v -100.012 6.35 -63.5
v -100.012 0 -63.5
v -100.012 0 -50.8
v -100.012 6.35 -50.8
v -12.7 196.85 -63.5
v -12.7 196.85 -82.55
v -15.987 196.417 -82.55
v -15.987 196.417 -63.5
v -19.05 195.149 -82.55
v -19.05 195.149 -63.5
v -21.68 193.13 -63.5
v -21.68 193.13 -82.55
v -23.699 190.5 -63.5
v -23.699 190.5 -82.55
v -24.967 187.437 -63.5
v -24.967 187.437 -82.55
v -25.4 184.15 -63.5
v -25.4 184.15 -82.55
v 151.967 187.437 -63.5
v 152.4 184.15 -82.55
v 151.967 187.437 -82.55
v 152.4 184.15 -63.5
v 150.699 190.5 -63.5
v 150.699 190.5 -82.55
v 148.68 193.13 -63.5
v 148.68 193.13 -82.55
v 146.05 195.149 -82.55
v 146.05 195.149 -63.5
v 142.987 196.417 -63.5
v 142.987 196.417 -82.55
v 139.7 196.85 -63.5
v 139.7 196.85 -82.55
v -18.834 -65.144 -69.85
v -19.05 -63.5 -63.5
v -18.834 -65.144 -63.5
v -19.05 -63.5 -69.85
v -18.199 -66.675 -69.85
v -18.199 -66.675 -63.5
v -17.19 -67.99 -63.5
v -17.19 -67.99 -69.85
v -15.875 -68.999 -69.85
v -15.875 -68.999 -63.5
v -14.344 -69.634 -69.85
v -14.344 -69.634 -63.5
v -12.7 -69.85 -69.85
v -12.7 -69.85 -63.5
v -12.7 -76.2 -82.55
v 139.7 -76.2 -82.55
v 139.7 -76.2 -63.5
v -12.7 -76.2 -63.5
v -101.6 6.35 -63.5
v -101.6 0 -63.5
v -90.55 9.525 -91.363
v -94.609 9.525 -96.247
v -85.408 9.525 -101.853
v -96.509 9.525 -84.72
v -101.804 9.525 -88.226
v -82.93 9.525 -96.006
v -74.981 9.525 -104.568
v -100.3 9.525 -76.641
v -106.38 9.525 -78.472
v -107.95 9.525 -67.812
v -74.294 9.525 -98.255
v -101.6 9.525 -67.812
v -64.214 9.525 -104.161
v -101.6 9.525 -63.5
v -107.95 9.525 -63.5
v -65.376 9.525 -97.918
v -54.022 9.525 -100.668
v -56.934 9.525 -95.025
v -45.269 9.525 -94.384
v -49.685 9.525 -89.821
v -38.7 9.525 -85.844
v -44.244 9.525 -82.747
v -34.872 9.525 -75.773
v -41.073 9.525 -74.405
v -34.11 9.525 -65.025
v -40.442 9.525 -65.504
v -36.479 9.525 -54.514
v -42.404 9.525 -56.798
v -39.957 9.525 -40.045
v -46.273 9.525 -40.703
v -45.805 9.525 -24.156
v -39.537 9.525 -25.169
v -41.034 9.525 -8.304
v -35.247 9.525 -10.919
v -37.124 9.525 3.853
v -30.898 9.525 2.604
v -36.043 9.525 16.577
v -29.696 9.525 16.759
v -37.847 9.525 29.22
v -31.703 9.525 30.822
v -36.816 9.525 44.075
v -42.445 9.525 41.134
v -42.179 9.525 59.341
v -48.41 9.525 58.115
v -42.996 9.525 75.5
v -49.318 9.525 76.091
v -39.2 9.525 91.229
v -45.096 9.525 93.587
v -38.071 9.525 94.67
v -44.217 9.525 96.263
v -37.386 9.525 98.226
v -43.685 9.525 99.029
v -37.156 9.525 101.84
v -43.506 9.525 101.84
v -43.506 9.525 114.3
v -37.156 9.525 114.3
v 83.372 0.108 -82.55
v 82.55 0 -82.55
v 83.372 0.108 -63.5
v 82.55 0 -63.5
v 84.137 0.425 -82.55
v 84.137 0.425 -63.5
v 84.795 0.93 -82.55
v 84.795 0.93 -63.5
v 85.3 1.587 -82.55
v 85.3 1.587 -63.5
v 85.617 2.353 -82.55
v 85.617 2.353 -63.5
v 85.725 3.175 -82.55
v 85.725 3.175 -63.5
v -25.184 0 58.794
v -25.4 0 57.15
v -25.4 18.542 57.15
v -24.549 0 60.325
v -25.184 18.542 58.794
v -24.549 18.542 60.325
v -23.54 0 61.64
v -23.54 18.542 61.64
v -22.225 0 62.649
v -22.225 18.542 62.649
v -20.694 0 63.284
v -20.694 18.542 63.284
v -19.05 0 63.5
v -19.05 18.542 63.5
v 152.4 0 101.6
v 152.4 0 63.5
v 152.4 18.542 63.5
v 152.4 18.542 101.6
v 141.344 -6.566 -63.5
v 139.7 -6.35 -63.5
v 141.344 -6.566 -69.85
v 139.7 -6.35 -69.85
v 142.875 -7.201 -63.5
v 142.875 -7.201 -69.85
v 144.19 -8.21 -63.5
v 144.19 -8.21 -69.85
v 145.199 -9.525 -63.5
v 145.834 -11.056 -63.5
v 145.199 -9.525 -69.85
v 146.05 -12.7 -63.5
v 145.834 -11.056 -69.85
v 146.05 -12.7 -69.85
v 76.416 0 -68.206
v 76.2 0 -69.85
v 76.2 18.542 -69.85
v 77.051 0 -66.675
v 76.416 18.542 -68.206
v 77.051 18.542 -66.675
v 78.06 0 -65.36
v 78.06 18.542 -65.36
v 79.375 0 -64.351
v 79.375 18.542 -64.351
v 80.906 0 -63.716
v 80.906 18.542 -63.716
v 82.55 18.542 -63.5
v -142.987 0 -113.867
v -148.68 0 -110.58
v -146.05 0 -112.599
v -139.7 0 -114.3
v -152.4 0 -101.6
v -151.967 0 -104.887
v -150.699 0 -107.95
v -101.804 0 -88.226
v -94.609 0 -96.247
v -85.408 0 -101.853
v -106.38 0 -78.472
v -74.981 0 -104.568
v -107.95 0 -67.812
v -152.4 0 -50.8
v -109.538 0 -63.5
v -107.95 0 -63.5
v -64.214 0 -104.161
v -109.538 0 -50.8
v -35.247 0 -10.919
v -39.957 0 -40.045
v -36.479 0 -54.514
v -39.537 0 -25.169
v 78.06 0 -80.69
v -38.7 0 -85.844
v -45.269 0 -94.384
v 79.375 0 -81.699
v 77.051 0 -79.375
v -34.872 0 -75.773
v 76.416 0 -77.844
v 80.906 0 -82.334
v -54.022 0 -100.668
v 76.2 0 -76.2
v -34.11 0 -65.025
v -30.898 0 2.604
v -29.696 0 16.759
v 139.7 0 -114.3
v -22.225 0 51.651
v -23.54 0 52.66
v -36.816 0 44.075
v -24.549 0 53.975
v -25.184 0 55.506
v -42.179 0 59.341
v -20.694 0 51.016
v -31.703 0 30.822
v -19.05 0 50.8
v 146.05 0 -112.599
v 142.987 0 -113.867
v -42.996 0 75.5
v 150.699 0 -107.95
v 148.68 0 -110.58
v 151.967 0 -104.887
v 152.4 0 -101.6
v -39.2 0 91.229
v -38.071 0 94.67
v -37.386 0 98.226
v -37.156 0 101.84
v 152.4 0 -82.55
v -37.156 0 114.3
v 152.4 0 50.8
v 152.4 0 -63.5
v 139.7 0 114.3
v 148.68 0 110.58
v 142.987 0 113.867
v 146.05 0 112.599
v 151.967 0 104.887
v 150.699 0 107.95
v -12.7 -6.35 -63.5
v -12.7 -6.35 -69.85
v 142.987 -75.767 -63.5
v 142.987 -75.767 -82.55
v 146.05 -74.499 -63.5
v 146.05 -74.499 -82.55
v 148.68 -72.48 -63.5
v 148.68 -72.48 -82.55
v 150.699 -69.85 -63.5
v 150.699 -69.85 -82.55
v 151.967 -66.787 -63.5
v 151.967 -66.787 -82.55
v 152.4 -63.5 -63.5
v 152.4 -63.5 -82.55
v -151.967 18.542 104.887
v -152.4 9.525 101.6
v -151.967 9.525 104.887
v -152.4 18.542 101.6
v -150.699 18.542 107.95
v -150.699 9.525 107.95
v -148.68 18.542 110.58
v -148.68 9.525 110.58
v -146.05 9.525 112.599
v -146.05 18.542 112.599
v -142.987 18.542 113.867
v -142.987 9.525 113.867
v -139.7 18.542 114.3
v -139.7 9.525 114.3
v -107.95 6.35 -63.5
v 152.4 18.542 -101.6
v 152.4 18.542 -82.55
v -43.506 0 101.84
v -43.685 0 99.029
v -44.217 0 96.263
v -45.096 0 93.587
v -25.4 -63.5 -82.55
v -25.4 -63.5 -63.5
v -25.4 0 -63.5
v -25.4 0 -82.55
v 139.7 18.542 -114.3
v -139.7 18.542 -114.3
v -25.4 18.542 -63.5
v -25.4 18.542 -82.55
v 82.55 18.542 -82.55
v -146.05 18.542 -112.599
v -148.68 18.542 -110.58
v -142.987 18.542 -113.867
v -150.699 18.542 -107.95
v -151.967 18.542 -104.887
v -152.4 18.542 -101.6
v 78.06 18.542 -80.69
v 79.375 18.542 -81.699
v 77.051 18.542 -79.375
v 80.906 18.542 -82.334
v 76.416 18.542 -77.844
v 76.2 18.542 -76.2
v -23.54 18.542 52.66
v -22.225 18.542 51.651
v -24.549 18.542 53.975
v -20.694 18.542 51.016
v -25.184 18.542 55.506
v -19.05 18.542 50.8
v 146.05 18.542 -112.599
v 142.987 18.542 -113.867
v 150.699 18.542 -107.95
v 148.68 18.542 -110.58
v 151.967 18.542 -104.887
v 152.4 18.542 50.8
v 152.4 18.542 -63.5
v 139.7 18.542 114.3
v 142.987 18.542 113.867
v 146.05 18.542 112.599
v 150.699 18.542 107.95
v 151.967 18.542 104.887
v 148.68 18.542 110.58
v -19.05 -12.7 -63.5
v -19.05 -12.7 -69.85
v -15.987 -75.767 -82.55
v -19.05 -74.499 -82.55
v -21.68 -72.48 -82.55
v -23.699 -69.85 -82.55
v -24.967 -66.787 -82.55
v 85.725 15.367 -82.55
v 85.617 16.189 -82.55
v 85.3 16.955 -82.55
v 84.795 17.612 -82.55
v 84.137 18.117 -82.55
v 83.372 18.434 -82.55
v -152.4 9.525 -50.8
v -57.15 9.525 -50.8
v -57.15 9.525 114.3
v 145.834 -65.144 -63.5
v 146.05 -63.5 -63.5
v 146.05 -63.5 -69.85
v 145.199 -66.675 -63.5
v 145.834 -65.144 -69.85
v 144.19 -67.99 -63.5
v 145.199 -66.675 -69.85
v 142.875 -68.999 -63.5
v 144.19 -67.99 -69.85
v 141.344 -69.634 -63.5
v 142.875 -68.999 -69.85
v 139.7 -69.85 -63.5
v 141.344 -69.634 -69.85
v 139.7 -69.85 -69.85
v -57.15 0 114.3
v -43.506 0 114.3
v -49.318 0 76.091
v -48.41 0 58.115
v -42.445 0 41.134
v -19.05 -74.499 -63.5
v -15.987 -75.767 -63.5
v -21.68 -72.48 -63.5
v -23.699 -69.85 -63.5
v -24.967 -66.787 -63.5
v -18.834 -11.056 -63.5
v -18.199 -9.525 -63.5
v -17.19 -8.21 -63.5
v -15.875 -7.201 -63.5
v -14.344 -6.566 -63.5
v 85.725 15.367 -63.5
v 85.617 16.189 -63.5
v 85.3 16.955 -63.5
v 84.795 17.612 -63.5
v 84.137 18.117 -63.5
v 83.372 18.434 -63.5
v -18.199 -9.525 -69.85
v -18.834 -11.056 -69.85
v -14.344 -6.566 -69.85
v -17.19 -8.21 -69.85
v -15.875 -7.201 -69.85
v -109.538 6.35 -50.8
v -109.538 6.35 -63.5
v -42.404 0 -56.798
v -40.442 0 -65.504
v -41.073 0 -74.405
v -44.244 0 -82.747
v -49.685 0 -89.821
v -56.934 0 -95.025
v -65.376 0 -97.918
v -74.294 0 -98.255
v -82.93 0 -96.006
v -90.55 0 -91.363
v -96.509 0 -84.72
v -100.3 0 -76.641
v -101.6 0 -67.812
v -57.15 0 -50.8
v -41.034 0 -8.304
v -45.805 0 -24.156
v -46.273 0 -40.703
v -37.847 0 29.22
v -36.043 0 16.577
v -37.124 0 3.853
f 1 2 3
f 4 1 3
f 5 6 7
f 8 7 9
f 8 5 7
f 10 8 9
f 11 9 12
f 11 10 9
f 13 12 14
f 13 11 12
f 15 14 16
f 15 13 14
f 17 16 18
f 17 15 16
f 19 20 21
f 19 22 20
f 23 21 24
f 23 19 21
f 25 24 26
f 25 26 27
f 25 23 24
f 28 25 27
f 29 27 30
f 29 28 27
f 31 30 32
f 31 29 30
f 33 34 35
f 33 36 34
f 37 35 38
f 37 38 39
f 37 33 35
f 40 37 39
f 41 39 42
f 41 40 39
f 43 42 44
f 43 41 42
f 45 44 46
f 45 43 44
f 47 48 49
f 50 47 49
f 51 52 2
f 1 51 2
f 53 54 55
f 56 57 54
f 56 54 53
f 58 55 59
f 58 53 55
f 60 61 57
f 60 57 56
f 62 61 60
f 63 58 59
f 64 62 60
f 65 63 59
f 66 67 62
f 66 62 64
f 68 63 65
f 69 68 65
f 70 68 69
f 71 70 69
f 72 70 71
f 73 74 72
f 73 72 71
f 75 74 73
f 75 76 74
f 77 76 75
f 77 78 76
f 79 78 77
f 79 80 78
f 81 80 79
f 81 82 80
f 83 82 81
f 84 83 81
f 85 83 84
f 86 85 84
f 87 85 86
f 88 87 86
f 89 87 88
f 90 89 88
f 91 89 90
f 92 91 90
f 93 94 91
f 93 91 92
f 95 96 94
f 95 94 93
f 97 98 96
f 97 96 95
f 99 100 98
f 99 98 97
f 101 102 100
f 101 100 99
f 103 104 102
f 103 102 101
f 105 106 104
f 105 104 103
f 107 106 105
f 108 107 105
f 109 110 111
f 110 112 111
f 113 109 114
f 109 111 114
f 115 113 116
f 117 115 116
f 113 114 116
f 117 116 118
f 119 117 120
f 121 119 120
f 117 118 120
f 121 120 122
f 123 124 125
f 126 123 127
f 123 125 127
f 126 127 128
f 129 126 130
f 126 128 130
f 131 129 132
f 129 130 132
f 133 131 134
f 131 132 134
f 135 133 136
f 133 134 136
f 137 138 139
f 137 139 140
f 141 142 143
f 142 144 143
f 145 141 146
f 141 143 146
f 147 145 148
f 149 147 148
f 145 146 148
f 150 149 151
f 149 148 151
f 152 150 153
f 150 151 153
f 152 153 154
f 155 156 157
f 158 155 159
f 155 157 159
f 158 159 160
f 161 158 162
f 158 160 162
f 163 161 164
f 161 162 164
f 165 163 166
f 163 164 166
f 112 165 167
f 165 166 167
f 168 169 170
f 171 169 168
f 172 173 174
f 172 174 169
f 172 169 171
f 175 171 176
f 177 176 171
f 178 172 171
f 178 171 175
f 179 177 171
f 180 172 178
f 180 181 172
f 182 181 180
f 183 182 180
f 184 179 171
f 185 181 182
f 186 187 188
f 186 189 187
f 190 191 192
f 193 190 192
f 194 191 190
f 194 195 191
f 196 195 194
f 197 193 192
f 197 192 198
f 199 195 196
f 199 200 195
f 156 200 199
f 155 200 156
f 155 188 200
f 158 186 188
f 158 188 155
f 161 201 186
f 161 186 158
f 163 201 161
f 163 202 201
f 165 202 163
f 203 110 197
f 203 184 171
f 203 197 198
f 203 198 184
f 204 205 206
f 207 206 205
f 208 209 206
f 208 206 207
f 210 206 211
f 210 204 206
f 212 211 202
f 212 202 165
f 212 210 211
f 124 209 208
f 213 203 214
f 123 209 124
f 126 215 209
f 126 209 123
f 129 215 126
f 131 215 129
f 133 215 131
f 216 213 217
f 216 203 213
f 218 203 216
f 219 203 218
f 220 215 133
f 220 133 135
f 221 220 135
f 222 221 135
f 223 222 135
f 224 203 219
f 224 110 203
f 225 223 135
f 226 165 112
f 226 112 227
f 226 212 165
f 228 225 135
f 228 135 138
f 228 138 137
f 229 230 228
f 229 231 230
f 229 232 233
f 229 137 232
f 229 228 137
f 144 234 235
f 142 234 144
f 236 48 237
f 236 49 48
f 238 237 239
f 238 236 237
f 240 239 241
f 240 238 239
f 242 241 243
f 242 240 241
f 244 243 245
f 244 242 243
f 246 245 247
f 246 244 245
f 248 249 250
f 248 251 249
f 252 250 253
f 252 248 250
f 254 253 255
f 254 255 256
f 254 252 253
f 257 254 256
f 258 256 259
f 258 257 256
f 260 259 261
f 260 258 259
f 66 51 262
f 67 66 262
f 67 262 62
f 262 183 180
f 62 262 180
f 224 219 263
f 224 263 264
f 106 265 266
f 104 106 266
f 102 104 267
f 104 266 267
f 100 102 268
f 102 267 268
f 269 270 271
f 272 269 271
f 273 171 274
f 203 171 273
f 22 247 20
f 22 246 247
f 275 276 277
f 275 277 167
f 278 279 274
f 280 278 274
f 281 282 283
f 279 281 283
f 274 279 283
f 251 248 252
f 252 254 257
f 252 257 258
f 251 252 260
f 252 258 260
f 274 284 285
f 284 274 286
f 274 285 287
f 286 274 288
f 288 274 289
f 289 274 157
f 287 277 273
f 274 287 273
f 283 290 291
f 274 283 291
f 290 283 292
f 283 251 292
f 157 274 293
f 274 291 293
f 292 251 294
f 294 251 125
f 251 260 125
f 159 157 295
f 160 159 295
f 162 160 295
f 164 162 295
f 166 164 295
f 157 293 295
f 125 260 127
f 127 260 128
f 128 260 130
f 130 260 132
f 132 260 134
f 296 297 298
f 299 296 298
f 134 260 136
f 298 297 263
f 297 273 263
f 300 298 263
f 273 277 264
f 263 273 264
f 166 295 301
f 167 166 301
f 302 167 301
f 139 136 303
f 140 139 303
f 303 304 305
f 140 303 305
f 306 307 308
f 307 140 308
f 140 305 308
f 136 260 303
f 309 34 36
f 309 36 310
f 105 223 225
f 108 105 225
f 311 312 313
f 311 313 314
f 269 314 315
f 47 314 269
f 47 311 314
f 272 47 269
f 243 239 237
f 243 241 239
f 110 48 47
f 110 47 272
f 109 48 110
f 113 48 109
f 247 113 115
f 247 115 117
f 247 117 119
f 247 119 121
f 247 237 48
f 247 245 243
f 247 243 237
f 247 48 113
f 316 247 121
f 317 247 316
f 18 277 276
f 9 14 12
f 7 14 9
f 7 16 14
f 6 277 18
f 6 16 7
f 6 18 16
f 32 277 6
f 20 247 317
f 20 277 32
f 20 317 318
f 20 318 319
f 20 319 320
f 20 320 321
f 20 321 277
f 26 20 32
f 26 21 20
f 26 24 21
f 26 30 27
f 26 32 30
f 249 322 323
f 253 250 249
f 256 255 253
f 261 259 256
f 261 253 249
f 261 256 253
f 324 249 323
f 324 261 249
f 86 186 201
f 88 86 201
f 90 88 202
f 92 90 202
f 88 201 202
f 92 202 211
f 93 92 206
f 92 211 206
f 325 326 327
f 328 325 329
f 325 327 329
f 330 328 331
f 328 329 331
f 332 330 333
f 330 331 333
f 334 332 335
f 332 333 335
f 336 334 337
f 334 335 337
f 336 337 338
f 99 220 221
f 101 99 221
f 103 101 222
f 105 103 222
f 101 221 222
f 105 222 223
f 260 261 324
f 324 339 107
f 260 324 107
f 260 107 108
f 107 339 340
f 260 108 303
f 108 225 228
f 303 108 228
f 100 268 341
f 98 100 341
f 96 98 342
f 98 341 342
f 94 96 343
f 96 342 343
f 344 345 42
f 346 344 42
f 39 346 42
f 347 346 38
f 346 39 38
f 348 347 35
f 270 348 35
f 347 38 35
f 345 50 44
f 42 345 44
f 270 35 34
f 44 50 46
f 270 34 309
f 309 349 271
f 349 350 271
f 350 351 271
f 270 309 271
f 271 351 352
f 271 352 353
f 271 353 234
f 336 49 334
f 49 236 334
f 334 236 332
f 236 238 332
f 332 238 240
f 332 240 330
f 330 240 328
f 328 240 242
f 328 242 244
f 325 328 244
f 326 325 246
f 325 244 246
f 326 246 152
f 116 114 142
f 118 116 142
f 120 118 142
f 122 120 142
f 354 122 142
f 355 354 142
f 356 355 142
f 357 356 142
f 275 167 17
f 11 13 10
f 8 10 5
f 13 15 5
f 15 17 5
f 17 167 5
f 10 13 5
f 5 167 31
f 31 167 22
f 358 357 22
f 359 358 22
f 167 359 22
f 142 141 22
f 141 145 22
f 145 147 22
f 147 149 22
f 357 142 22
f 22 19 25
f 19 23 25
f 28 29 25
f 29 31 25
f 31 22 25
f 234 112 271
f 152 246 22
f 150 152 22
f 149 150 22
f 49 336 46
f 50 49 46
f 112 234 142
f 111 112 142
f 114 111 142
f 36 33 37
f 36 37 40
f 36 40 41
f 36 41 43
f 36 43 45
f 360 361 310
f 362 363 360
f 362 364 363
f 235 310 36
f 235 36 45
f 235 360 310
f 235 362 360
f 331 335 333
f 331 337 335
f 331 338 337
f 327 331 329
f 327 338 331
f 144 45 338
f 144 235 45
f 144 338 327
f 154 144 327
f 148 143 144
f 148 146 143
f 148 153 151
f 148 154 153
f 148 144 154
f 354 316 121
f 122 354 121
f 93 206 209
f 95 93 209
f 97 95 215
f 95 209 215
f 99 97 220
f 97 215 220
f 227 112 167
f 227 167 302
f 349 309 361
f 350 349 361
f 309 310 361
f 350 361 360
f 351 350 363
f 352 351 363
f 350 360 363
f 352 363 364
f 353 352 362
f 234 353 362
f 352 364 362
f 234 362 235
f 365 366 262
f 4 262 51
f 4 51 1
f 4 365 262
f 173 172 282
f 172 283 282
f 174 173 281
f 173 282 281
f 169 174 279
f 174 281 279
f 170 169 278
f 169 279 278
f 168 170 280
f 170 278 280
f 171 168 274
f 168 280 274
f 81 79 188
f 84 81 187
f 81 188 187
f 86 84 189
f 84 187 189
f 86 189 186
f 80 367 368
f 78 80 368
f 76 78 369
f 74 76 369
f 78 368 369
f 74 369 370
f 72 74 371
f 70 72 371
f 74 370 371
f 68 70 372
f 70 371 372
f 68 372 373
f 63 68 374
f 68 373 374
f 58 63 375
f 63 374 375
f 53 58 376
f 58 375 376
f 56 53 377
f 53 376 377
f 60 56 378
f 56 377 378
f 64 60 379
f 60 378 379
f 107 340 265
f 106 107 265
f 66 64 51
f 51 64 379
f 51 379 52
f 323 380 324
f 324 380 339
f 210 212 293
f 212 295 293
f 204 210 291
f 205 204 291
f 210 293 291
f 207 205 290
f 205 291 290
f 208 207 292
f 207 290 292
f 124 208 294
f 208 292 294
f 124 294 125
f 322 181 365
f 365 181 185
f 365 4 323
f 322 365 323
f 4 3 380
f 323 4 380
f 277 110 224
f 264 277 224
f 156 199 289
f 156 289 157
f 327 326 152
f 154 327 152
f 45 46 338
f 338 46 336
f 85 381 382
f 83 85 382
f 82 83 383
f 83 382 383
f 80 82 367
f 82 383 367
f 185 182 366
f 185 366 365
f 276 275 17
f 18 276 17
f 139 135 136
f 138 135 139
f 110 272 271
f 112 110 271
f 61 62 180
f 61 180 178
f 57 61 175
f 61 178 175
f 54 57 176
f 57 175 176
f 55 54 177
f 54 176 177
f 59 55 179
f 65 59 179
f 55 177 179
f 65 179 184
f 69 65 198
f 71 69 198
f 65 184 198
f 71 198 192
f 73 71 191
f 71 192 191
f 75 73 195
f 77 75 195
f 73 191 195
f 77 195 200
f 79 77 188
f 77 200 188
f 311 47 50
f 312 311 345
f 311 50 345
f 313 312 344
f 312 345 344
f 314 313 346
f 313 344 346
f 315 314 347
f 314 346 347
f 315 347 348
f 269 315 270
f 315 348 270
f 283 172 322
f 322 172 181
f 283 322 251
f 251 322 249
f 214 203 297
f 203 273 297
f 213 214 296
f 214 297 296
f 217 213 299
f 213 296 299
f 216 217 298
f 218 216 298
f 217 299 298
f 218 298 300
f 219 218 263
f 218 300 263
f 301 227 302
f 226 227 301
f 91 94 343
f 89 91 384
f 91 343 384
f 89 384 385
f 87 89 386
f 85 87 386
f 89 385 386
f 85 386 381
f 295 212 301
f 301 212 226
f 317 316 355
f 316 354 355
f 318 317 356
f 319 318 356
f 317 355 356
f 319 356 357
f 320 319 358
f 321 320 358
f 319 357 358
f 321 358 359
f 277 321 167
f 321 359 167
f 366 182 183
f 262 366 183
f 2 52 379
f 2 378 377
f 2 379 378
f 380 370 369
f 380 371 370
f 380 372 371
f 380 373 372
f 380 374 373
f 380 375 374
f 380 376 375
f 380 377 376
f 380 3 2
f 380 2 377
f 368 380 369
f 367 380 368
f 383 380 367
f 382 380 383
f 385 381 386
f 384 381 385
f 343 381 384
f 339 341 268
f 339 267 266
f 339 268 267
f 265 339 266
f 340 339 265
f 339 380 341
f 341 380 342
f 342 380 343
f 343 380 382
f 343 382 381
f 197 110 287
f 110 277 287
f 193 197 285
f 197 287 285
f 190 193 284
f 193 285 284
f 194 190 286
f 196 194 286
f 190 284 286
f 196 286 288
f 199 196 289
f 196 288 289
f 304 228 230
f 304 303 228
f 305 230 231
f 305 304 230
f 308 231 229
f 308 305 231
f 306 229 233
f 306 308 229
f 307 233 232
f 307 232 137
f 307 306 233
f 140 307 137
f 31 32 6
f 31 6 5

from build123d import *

# Parameters (mm, degrees)
F0_W           = 304.8
F0_H           = 228.6
F1_DEPTH       = 18.542
F2_W           = 177.8
F2_H           = 12.7
F2_W_2         = 76.2
F2_H_2         = 19.05
F3_DEPTH       = 18.543
F4_W           = 95.25
F4_H           = 165.1
F5_DEPTH       = 9.525
F6_W           = 9.525
F6_H           = 12.7
F7_DEPTH       = 6.35
F9_DEPTH       = 9.525
F10_R          = 12.7
F11_R          = 6.34999
F12_W          = 273.05
F12_H          = 19.05
F13_DEPTH      = 152.4
F13_DEPTH_BACK = 25.4
F14_W          = 18.542
F14_H          = 19.05
F15_DEPTH      = 111.125
F16_R          = 12.7
F17_R          = 3.175
F18_W          = 165.1
F18_H          = 63.5
F19_DEPTH      = 6.35
F20_R          = 6.35


# Not quite as in the source:
# - a fillet or chamfer is up to 0.001 mm smaller than in the source, because OpenCascade refuses the exact size


with BuildPart() as f1:
    # F0 (on Front) → F1 (new body)
    with BuildSketch(Plane.XZ):
        Rectangle(F0_W, F0_H)
    extrude(amount=-F1_DEPTH)

    # F2 (on face) → F3 (cut, through all)
    with BuildSketch(Plane.XZ):
        with Locations((63.5, 57.15)):
            Rectangle(F2_W, F2_H)
        with Locations((114.3, -73.025)):
            Rectangle(F2_W_2, F2_H_2)
    extrude(amount=-F3_DEPTH, mode=Mode.SUBTRACT)

    # F4 (on face) → F5 (cut)
    with BuildSketch(Plane.XZ):
        with Locations((-104.775, 31.75)):
            Rectangle(F4_W, F4_H)
    extrude(amount=-F5_DEPTH, mode=Mode.SUBTRACT)

    # F6 (on face) → F7 (cut)
    with BuildSketch(Plane.XZ):
        with Locations((-104.775, -57.15)):
            Rectangle(F6_W, F6_H)
    extrude(amount=-F7_DEPTH, mode=Mode.SUBTRACT)

    # F8 (on face) → F9 (cut)
    with BuildSketch(Plane.XZ):
        with BuildLine():
            ThreePointArc((-39.1997749684, 91.2285561772), (-37.6718013693, 96.4369674893), (-37.1562764049, 101.8403447412))
            Line((-37.1562764049, 101.8403447412), (-37.1562764049, 114.3))
            Line((-37.1562764049, 114.3), (-43.5062764049, 114.3))
            Line((-43.5062764049, 114.3), (-43.5062764049, 101.8403447412))
            ThreePointArc((-43.5062764049, 101.8403447412), (-43.9072402661, 97.6377179897), (-45.0956641765, 93.5867314137))
            ThreePointArc((-45.0956641765, 93.5867314137), (-49.5107233258, 67.0703536947), (-42.4445124385, 41.1342842484))
            ThreePointArc((-42.4445124385, 41.1342842484), (-36.0430844049, 16.5774501543), (-41.0339246807, -8.3044286924))
            ThreePointArc((-41.0339246807, -8.3044286924), (-46.586082977, -32.4137993186), (-42.4044952455, -56.7982726117))
            ThreePointArc((-42.4044952455, -56.7982726117), (-65.3759429594, -97.9182199908), (-101.6, -67.8124867486))
            Line((-101.6, -67.8124867486), (-101.6, -63.5))
            Line((-101.6, -63.5), (-107.95, -63.5))
            Line((-107.95, -63.5), (-107.95, -67.8124867486))
            ThreePointArc((-107.95, -67.8124867486), (-64.2143658736, -104.1610750006), (-36.4794594428, -54.5143175474))
            ThreePointArc((-36.4794594428, -54.5143175474), (-40.2386175991, -32.5931962998), (-35.2473457461, -10.9193864805))
            ThreePointArc((-35.2473457461, -10.9193864805), (-29.6956675249, 16.7585549608), (-36.8164461183, 44.0749252491))
            ThreePointArc((-36.8164461183, 44.0749252491), (-43.1688189483, 67.3908983351), (-39.1997749684, 91.2285561772))
        make_face()
    extrude(amount=-F9_DEPTH, mode=Mode.SUBTRACT)

    # F10
    f10_edges = [f1.edges().sort_by_distance(p)[0] for p in [
        (152.4, 9.271, 114.3),
        (152.4, 9.271, -114.3),
        (-152.4, 14.0335, 114.3),
        (-152.4, 9.271, -114.3),
    ]]
    fillet(f10_edges, radius=F10_R)

    # F11 (radius 6.35 in the source; OpenCascade refuses exactly that, so slightly less here)
    f11_edges = [f1.edges().sort_by_distance(p)[0] for p in [
        (-25.4, 9.271, 63.5),
        (-25.4, 9.271, 50.8),
        (76.2, 9.271, -82.55),
        (76.2, 9.271, -63.5),
    ]]
    fillet(f11_edges, radius=F11_R)


with BuildPart() as f13:
    # F12 (on Right) → F13 (new body, two sides)
    with BuildSketch(Plane.YZ) as f13_sk:
        with Locations((60.325, -73.025)):
            Rectangle(F12_W, F12_H)
    extrude(amount=F13_DEPTH)
    extrude(f13_sk.sketch, amount=-F13_DEPTH_BACK)

    # F14 (on face) → F15 (cut)
    with BuildSketch(Plane(origin=(-25.4, 0, 0), x_dir=(0, -1, 0), z_dir=(-1, 0, 0))):
        with Locations((-9.271, -73.025)):
            Rectangle(F14_W, F14_H)
    extrude(amount=-F15_DEPTH, mode=Mode.SUBTRACT)

    # F16
    f16_edges = [f13.edges().sort_by_distance(p)[0] for p in [
        (-25.4, -76.2, -73.025),
        (152.4, -76.2, -73.025),
        (152.4, 196.85, -73.025),
        (-25.4, 196.85, -73.025),
    ]]
    fillet(f16_edges, radius=F16_R)

    # F17
    f17_edges = [f13.edges().sort_by_distance(p)[0] for p in [
        (85.725, 18.542, -73.025),
        (85.725, 0, -73.025),
    ]]
    fillet(f17_edges, radius=F17_R)

    # F18 (on face) → F19 (cut)
    with BuildSketch(Plane.XY.offset(-63.5)):
        with Locations((63.5, -38.1)):
            Rectangle(F18_W, F18_H)
    extrude(amount=-F19_DEPTH, mode=Mode.SUBTRACT)

    # F20
    f20_edges = [f13.edges().sort_by_distance(p)[0] for p in [
        (-19.05, -69.85, -66.675),
        (-19.05, -6.35, -66.675),
        (146.05, -6.35, -66.675),
        (146.05, -69.85, -66.675),
    ]]
    fillet(f20_edges, radius=F20_R)


solid = Compound([f1.part, f13.part])
